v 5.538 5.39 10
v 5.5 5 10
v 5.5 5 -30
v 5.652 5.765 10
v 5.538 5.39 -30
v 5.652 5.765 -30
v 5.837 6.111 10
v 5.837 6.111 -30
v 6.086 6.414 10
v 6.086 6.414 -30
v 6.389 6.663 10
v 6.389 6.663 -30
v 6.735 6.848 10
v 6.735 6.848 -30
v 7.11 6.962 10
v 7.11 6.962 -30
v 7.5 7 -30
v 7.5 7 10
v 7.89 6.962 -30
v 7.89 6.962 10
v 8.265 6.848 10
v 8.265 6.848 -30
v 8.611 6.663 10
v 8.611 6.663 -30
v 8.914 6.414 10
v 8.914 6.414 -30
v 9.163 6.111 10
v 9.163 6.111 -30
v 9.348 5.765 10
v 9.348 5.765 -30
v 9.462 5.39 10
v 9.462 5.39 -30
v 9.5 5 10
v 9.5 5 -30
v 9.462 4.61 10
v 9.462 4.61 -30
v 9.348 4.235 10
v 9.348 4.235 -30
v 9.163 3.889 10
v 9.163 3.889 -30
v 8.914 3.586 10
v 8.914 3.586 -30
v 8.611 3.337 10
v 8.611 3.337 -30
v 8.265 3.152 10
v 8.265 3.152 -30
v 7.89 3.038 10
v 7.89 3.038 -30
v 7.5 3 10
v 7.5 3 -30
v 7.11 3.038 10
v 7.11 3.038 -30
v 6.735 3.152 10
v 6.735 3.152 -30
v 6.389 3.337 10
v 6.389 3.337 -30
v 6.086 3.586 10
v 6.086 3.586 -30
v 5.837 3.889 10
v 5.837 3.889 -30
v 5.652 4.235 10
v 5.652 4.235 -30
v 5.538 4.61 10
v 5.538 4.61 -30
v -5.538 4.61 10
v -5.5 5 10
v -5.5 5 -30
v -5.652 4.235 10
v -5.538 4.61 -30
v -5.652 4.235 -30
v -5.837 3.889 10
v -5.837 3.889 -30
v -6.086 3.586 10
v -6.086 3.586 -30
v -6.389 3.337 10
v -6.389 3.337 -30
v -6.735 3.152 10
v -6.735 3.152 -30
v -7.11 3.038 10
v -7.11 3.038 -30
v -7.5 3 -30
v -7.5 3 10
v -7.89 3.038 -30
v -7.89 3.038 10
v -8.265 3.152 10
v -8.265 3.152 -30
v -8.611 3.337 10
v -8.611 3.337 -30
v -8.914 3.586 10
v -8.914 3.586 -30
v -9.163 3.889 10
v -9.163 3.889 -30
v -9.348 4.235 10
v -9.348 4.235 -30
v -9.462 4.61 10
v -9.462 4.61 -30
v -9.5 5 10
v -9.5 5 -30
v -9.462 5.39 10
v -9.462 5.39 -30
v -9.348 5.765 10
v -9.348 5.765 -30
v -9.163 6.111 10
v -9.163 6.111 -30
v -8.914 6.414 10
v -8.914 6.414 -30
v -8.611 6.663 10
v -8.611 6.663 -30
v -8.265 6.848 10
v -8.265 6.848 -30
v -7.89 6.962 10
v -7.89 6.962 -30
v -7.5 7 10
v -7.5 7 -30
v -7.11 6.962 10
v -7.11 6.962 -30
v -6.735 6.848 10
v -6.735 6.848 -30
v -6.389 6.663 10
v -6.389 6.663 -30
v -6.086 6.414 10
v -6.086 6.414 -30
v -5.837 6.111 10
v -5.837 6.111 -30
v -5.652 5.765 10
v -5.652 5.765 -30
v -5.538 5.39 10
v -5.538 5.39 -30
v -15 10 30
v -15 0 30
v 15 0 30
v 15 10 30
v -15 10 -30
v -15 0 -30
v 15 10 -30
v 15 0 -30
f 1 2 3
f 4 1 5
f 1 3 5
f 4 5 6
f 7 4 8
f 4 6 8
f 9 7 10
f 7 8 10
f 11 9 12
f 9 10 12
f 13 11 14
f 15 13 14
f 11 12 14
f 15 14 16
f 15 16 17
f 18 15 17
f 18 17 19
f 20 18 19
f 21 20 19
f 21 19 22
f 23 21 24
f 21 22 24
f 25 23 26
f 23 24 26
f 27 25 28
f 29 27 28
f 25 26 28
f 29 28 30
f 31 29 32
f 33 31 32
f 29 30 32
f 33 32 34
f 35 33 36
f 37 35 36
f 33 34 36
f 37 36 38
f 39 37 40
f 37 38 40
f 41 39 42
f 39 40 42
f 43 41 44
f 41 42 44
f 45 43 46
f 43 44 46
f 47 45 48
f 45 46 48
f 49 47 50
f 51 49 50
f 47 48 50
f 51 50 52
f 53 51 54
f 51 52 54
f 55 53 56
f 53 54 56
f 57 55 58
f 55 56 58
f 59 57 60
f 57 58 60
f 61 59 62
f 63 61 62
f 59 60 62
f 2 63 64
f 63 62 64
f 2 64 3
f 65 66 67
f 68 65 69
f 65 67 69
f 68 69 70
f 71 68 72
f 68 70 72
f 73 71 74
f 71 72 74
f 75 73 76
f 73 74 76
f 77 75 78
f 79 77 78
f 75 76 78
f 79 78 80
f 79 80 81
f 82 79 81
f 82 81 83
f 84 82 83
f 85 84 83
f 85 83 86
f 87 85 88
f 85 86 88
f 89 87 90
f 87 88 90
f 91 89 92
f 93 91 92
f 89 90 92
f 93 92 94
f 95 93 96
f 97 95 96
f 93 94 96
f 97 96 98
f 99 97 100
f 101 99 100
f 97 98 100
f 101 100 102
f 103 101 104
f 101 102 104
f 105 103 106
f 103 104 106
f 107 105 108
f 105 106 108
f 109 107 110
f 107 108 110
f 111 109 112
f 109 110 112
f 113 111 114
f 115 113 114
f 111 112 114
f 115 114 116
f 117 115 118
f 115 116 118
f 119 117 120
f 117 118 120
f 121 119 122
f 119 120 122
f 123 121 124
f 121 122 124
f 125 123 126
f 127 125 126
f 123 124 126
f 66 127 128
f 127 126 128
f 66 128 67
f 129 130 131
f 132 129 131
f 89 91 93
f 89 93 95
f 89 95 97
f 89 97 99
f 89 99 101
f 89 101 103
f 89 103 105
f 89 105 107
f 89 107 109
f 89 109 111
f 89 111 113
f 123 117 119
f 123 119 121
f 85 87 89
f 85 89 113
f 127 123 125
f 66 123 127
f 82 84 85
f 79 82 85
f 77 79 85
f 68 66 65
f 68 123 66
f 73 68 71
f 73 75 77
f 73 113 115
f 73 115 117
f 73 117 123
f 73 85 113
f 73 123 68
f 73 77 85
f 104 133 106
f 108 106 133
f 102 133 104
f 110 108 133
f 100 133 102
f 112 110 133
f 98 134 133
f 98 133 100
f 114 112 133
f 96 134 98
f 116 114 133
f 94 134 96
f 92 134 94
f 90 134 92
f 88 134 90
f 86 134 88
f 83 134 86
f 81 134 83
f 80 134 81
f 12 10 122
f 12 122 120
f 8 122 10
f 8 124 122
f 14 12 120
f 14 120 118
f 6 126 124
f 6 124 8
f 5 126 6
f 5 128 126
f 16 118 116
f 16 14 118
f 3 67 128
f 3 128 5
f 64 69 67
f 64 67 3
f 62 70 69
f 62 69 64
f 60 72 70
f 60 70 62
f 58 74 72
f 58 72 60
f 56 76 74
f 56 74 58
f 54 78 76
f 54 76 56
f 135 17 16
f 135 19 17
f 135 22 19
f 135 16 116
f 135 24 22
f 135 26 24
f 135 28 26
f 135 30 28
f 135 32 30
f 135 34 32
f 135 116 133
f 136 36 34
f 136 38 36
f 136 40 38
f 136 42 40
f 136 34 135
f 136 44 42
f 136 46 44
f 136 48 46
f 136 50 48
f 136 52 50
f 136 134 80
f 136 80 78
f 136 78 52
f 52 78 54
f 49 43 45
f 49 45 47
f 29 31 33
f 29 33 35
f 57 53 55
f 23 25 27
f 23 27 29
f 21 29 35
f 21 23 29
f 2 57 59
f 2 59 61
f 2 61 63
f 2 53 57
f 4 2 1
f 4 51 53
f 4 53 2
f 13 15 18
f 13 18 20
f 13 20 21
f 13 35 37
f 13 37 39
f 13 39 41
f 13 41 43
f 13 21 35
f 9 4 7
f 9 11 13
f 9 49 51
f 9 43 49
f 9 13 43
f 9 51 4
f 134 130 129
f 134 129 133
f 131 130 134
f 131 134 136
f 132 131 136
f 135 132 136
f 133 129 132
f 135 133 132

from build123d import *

# Parameters (mm, degrees)
SKETCH_1_W          = 30
SKETCH_1_H          = 60
EXTRUDE_1_DEPTH     = 10
SKETCH_2_R          = 2
CUT_EXTRUDE_1_DEPTH = 40


with BuildPart() as part:
    # 草图1 → 凸台-拉伸1 (new body)
    with BuildSketch(Plane(origin=(0, 0, 0), x_dir=(1, 0, 0), z_dir=(0, 1, 0))):
        Rectangle(SKETCH_1_W, SKETCH_1_H)
    extrude(amount=EXTRUDE_1_DEPTH)

    # 草图2 → 切除-拉伸1 (cut)
    with BuildSketch(Plane(origin=(0, 0, -30), x_dir=(-1, 0, 0), z_dir=(0, 0, -1))):
        with Locations((-7.5, 5)):
            Circle(SKETCH_2_R)
        with Locations(Location((7.5, 5, 0), (0, 0, 180))):
            Circle(SKETCH_2_R)
    extrude(amount=-CUT_EXTRUDE_1_DEPTH, mode=Mode.SUBTRACT)


solid = part.part
